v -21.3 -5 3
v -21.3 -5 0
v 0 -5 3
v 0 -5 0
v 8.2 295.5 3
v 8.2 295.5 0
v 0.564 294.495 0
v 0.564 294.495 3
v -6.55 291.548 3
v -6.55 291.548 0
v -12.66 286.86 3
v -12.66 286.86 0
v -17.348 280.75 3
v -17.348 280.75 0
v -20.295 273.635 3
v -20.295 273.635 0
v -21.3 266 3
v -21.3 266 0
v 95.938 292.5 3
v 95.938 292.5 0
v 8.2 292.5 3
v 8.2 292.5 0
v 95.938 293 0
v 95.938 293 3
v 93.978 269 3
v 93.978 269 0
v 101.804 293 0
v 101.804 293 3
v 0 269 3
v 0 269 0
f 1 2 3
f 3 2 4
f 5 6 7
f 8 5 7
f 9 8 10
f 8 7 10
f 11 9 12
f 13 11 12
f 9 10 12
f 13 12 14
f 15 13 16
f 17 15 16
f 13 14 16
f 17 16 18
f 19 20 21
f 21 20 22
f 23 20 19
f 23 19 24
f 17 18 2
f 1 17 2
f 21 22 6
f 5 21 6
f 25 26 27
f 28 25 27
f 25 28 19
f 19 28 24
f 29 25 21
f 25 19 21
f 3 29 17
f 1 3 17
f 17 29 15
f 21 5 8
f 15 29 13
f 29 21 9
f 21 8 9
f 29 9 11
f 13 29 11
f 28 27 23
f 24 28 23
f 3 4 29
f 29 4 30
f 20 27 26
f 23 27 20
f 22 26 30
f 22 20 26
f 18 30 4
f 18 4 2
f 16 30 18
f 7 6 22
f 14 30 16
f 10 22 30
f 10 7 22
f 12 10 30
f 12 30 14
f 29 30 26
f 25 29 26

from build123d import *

# Parameters (mm, degrees)
BOSS_EXTRUDE1_DEPTH = 3
BOSS_EXTRUDE2_DEPTH = 3
SKETCH3_W           = 87.73773678
SKETCH3_H           = 3.000342445
CUT_EXTRUDE1_DEPTH  = 300


with BuildPart() as part:
    # Sketch1 → Boss-Extrude1 (new body)
    with BuildSketch(Plane.XY):
        with BuildLine():
            Line((93.97826087, 269), (101.804347826, 293))
            Line((101.804347826, 293), (20.086056782, 293))
            ThreePointArc((20.086056782, 293), (-7.9185527, 290.707315192), (-21.3, 266))
            Line((-21.3, 266), (-21.3, -5))
            Line((-21.3, -5), (0, -5))
            Line((0, -5), (0, 269))
            Line((0, 269), (93.97826087, 269))
        make_face()
    extrude(amount=BOSS_EXTRUDE1_DEPTH)

    # Sketch2 → Boss-Extrude2 (add)
    with BuildSketch(Plane.XY.offset(3)):
        Polygon((8.199539928, 295.500342445), (95.938079236, 295.500342445), (95.938079236, 293), (8.804994825, 293), align=None)
    extrude(amount=-BOSS_EXTRUDE2_DEPTH)

    # Sketch3 → Cut-Extrude1 (cut)
    with BuildSketch(Plane(origin=(0, 0, 0), x_dir=(-1, 0, 0), z_dir=(0, 0, -1))):
        with Locations((-52.069210846, 294.000171223)):
            Rectangle(SKETCH3_W, SKETCH3_H)
    extrude(amount=-CUT_EXTRUDE1_DEPTH, mode=Mode.SUBTRACT)


solid = part.part
